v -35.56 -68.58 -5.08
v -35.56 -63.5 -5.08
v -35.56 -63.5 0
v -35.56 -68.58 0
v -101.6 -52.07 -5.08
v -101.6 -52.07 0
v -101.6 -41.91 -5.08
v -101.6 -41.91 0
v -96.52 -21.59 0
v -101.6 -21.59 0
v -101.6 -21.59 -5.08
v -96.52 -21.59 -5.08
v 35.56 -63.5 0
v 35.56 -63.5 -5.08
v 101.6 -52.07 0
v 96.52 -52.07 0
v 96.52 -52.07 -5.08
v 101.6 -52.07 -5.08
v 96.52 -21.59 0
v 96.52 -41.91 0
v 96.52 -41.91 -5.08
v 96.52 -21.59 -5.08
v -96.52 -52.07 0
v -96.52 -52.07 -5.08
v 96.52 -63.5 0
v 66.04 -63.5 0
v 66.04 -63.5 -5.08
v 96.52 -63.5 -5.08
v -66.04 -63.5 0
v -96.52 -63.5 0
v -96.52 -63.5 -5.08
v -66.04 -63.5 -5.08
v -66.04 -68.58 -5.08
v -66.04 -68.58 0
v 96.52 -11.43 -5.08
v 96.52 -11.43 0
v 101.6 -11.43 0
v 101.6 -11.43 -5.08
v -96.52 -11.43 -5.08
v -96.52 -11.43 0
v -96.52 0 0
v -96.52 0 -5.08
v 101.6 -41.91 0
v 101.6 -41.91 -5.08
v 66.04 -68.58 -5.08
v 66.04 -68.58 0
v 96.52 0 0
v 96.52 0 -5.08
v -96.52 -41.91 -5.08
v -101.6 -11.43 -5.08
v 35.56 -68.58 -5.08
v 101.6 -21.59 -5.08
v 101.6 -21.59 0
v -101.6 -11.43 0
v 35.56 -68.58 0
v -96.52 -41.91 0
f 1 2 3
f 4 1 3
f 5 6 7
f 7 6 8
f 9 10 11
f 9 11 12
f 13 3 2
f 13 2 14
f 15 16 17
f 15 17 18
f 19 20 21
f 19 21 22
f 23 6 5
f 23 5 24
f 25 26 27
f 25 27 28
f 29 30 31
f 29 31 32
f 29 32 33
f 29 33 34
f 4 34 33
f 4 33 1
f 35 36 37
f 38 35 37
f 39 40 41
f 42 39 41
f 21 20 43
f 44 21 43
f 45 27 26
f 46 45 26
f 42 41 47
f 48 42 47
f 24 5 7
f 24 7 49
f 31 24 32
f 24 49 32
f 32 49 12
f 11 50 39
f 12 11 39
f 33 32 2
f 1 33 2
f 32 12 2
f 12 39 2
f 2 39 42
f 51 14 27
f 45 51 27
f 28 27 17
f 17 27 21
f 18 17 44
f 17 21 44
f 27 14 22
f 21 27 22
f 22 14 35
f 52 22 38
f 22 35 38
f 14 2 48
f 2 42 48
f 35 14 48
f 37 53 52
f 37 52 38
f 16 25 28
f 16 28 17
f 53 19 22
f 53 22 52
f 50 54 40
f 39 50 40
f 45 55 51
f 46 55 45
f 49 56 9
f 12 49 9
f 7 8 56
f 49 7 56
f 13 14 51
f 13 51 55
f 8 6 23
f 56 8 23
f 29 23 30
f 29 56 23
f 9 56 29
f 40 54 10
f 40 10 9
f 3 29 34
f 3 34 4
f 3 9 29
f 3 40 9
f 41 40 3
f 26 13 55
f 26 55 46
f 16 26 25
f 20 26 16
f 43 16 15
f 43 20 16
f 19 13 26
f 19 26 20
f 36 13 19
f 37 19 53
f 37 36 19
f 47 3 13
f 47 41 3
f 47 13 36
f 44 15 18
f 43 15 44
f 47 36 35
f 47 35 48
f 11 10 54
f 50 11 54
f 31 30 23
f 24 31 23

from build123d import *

# Parameters (mm, degrees)
SKETCH1_W           = 193.04
SKETCH1_H           = 63.5
BOSS_EXTRUDE1_DEPTH = 5.08
SKETCH2_W           = 5.08
SKETCH2_H           = 10.16
BOSS_EXTRUDE2_DEPTH = 5.08
SKETCH3_W           = 30.48
SKETCH3_H           = 5.08
BOSS_EXTRUDE3_DEPTH = 5.08


with BuildPart() as part:
    # Sketch1 → Boss-Extrude1 (new body)
    with BuildSketch(Plane.XY):
        with Locations((0, -31.75)):
            Rectangle(SKETCH1_W, SKETCH1_H)
    extrude(amount=-BOSS_EXTRUDE1_DEPTH)

    # Sketch2 → Boss-Extrude2 (add)
    with BuildSketch(Plane.XY):
        with Locations((99.06, -46.99)):
            Rectangle(SKETCH2_W, SKETCH2_H)
        with Locations((99.06, -16.51)):
            Rectangle(SKETCH2_W, SKETCH2_H)
        with Locations((-99.06, -46.99)):
            Rectangle(SKETCH2_W, SKETCH2_H)
        with Locations((-99.06, -16.51)):
            Rectangle(SKETCH2_W, SKETCH2_H)
    extrude(amount=-BOSS_EXTRUDE2_DEPTH)

    # Sketch3 → Boss-Extrude3 (add)
    with BuildSketch(Plane.XZ.offset(63.5)):
        with Locations((50.8, -2.54)):
            Rectangle(SKETCH3_W, SKETCH3_H)
        with Locations((-50.8, -2.54)):
            Rectangle(SKETCH3_W, SKETCH3_H)
    extrude(amount=BOSS_EXTRUDE3_DEPTH)


solid = part.part
